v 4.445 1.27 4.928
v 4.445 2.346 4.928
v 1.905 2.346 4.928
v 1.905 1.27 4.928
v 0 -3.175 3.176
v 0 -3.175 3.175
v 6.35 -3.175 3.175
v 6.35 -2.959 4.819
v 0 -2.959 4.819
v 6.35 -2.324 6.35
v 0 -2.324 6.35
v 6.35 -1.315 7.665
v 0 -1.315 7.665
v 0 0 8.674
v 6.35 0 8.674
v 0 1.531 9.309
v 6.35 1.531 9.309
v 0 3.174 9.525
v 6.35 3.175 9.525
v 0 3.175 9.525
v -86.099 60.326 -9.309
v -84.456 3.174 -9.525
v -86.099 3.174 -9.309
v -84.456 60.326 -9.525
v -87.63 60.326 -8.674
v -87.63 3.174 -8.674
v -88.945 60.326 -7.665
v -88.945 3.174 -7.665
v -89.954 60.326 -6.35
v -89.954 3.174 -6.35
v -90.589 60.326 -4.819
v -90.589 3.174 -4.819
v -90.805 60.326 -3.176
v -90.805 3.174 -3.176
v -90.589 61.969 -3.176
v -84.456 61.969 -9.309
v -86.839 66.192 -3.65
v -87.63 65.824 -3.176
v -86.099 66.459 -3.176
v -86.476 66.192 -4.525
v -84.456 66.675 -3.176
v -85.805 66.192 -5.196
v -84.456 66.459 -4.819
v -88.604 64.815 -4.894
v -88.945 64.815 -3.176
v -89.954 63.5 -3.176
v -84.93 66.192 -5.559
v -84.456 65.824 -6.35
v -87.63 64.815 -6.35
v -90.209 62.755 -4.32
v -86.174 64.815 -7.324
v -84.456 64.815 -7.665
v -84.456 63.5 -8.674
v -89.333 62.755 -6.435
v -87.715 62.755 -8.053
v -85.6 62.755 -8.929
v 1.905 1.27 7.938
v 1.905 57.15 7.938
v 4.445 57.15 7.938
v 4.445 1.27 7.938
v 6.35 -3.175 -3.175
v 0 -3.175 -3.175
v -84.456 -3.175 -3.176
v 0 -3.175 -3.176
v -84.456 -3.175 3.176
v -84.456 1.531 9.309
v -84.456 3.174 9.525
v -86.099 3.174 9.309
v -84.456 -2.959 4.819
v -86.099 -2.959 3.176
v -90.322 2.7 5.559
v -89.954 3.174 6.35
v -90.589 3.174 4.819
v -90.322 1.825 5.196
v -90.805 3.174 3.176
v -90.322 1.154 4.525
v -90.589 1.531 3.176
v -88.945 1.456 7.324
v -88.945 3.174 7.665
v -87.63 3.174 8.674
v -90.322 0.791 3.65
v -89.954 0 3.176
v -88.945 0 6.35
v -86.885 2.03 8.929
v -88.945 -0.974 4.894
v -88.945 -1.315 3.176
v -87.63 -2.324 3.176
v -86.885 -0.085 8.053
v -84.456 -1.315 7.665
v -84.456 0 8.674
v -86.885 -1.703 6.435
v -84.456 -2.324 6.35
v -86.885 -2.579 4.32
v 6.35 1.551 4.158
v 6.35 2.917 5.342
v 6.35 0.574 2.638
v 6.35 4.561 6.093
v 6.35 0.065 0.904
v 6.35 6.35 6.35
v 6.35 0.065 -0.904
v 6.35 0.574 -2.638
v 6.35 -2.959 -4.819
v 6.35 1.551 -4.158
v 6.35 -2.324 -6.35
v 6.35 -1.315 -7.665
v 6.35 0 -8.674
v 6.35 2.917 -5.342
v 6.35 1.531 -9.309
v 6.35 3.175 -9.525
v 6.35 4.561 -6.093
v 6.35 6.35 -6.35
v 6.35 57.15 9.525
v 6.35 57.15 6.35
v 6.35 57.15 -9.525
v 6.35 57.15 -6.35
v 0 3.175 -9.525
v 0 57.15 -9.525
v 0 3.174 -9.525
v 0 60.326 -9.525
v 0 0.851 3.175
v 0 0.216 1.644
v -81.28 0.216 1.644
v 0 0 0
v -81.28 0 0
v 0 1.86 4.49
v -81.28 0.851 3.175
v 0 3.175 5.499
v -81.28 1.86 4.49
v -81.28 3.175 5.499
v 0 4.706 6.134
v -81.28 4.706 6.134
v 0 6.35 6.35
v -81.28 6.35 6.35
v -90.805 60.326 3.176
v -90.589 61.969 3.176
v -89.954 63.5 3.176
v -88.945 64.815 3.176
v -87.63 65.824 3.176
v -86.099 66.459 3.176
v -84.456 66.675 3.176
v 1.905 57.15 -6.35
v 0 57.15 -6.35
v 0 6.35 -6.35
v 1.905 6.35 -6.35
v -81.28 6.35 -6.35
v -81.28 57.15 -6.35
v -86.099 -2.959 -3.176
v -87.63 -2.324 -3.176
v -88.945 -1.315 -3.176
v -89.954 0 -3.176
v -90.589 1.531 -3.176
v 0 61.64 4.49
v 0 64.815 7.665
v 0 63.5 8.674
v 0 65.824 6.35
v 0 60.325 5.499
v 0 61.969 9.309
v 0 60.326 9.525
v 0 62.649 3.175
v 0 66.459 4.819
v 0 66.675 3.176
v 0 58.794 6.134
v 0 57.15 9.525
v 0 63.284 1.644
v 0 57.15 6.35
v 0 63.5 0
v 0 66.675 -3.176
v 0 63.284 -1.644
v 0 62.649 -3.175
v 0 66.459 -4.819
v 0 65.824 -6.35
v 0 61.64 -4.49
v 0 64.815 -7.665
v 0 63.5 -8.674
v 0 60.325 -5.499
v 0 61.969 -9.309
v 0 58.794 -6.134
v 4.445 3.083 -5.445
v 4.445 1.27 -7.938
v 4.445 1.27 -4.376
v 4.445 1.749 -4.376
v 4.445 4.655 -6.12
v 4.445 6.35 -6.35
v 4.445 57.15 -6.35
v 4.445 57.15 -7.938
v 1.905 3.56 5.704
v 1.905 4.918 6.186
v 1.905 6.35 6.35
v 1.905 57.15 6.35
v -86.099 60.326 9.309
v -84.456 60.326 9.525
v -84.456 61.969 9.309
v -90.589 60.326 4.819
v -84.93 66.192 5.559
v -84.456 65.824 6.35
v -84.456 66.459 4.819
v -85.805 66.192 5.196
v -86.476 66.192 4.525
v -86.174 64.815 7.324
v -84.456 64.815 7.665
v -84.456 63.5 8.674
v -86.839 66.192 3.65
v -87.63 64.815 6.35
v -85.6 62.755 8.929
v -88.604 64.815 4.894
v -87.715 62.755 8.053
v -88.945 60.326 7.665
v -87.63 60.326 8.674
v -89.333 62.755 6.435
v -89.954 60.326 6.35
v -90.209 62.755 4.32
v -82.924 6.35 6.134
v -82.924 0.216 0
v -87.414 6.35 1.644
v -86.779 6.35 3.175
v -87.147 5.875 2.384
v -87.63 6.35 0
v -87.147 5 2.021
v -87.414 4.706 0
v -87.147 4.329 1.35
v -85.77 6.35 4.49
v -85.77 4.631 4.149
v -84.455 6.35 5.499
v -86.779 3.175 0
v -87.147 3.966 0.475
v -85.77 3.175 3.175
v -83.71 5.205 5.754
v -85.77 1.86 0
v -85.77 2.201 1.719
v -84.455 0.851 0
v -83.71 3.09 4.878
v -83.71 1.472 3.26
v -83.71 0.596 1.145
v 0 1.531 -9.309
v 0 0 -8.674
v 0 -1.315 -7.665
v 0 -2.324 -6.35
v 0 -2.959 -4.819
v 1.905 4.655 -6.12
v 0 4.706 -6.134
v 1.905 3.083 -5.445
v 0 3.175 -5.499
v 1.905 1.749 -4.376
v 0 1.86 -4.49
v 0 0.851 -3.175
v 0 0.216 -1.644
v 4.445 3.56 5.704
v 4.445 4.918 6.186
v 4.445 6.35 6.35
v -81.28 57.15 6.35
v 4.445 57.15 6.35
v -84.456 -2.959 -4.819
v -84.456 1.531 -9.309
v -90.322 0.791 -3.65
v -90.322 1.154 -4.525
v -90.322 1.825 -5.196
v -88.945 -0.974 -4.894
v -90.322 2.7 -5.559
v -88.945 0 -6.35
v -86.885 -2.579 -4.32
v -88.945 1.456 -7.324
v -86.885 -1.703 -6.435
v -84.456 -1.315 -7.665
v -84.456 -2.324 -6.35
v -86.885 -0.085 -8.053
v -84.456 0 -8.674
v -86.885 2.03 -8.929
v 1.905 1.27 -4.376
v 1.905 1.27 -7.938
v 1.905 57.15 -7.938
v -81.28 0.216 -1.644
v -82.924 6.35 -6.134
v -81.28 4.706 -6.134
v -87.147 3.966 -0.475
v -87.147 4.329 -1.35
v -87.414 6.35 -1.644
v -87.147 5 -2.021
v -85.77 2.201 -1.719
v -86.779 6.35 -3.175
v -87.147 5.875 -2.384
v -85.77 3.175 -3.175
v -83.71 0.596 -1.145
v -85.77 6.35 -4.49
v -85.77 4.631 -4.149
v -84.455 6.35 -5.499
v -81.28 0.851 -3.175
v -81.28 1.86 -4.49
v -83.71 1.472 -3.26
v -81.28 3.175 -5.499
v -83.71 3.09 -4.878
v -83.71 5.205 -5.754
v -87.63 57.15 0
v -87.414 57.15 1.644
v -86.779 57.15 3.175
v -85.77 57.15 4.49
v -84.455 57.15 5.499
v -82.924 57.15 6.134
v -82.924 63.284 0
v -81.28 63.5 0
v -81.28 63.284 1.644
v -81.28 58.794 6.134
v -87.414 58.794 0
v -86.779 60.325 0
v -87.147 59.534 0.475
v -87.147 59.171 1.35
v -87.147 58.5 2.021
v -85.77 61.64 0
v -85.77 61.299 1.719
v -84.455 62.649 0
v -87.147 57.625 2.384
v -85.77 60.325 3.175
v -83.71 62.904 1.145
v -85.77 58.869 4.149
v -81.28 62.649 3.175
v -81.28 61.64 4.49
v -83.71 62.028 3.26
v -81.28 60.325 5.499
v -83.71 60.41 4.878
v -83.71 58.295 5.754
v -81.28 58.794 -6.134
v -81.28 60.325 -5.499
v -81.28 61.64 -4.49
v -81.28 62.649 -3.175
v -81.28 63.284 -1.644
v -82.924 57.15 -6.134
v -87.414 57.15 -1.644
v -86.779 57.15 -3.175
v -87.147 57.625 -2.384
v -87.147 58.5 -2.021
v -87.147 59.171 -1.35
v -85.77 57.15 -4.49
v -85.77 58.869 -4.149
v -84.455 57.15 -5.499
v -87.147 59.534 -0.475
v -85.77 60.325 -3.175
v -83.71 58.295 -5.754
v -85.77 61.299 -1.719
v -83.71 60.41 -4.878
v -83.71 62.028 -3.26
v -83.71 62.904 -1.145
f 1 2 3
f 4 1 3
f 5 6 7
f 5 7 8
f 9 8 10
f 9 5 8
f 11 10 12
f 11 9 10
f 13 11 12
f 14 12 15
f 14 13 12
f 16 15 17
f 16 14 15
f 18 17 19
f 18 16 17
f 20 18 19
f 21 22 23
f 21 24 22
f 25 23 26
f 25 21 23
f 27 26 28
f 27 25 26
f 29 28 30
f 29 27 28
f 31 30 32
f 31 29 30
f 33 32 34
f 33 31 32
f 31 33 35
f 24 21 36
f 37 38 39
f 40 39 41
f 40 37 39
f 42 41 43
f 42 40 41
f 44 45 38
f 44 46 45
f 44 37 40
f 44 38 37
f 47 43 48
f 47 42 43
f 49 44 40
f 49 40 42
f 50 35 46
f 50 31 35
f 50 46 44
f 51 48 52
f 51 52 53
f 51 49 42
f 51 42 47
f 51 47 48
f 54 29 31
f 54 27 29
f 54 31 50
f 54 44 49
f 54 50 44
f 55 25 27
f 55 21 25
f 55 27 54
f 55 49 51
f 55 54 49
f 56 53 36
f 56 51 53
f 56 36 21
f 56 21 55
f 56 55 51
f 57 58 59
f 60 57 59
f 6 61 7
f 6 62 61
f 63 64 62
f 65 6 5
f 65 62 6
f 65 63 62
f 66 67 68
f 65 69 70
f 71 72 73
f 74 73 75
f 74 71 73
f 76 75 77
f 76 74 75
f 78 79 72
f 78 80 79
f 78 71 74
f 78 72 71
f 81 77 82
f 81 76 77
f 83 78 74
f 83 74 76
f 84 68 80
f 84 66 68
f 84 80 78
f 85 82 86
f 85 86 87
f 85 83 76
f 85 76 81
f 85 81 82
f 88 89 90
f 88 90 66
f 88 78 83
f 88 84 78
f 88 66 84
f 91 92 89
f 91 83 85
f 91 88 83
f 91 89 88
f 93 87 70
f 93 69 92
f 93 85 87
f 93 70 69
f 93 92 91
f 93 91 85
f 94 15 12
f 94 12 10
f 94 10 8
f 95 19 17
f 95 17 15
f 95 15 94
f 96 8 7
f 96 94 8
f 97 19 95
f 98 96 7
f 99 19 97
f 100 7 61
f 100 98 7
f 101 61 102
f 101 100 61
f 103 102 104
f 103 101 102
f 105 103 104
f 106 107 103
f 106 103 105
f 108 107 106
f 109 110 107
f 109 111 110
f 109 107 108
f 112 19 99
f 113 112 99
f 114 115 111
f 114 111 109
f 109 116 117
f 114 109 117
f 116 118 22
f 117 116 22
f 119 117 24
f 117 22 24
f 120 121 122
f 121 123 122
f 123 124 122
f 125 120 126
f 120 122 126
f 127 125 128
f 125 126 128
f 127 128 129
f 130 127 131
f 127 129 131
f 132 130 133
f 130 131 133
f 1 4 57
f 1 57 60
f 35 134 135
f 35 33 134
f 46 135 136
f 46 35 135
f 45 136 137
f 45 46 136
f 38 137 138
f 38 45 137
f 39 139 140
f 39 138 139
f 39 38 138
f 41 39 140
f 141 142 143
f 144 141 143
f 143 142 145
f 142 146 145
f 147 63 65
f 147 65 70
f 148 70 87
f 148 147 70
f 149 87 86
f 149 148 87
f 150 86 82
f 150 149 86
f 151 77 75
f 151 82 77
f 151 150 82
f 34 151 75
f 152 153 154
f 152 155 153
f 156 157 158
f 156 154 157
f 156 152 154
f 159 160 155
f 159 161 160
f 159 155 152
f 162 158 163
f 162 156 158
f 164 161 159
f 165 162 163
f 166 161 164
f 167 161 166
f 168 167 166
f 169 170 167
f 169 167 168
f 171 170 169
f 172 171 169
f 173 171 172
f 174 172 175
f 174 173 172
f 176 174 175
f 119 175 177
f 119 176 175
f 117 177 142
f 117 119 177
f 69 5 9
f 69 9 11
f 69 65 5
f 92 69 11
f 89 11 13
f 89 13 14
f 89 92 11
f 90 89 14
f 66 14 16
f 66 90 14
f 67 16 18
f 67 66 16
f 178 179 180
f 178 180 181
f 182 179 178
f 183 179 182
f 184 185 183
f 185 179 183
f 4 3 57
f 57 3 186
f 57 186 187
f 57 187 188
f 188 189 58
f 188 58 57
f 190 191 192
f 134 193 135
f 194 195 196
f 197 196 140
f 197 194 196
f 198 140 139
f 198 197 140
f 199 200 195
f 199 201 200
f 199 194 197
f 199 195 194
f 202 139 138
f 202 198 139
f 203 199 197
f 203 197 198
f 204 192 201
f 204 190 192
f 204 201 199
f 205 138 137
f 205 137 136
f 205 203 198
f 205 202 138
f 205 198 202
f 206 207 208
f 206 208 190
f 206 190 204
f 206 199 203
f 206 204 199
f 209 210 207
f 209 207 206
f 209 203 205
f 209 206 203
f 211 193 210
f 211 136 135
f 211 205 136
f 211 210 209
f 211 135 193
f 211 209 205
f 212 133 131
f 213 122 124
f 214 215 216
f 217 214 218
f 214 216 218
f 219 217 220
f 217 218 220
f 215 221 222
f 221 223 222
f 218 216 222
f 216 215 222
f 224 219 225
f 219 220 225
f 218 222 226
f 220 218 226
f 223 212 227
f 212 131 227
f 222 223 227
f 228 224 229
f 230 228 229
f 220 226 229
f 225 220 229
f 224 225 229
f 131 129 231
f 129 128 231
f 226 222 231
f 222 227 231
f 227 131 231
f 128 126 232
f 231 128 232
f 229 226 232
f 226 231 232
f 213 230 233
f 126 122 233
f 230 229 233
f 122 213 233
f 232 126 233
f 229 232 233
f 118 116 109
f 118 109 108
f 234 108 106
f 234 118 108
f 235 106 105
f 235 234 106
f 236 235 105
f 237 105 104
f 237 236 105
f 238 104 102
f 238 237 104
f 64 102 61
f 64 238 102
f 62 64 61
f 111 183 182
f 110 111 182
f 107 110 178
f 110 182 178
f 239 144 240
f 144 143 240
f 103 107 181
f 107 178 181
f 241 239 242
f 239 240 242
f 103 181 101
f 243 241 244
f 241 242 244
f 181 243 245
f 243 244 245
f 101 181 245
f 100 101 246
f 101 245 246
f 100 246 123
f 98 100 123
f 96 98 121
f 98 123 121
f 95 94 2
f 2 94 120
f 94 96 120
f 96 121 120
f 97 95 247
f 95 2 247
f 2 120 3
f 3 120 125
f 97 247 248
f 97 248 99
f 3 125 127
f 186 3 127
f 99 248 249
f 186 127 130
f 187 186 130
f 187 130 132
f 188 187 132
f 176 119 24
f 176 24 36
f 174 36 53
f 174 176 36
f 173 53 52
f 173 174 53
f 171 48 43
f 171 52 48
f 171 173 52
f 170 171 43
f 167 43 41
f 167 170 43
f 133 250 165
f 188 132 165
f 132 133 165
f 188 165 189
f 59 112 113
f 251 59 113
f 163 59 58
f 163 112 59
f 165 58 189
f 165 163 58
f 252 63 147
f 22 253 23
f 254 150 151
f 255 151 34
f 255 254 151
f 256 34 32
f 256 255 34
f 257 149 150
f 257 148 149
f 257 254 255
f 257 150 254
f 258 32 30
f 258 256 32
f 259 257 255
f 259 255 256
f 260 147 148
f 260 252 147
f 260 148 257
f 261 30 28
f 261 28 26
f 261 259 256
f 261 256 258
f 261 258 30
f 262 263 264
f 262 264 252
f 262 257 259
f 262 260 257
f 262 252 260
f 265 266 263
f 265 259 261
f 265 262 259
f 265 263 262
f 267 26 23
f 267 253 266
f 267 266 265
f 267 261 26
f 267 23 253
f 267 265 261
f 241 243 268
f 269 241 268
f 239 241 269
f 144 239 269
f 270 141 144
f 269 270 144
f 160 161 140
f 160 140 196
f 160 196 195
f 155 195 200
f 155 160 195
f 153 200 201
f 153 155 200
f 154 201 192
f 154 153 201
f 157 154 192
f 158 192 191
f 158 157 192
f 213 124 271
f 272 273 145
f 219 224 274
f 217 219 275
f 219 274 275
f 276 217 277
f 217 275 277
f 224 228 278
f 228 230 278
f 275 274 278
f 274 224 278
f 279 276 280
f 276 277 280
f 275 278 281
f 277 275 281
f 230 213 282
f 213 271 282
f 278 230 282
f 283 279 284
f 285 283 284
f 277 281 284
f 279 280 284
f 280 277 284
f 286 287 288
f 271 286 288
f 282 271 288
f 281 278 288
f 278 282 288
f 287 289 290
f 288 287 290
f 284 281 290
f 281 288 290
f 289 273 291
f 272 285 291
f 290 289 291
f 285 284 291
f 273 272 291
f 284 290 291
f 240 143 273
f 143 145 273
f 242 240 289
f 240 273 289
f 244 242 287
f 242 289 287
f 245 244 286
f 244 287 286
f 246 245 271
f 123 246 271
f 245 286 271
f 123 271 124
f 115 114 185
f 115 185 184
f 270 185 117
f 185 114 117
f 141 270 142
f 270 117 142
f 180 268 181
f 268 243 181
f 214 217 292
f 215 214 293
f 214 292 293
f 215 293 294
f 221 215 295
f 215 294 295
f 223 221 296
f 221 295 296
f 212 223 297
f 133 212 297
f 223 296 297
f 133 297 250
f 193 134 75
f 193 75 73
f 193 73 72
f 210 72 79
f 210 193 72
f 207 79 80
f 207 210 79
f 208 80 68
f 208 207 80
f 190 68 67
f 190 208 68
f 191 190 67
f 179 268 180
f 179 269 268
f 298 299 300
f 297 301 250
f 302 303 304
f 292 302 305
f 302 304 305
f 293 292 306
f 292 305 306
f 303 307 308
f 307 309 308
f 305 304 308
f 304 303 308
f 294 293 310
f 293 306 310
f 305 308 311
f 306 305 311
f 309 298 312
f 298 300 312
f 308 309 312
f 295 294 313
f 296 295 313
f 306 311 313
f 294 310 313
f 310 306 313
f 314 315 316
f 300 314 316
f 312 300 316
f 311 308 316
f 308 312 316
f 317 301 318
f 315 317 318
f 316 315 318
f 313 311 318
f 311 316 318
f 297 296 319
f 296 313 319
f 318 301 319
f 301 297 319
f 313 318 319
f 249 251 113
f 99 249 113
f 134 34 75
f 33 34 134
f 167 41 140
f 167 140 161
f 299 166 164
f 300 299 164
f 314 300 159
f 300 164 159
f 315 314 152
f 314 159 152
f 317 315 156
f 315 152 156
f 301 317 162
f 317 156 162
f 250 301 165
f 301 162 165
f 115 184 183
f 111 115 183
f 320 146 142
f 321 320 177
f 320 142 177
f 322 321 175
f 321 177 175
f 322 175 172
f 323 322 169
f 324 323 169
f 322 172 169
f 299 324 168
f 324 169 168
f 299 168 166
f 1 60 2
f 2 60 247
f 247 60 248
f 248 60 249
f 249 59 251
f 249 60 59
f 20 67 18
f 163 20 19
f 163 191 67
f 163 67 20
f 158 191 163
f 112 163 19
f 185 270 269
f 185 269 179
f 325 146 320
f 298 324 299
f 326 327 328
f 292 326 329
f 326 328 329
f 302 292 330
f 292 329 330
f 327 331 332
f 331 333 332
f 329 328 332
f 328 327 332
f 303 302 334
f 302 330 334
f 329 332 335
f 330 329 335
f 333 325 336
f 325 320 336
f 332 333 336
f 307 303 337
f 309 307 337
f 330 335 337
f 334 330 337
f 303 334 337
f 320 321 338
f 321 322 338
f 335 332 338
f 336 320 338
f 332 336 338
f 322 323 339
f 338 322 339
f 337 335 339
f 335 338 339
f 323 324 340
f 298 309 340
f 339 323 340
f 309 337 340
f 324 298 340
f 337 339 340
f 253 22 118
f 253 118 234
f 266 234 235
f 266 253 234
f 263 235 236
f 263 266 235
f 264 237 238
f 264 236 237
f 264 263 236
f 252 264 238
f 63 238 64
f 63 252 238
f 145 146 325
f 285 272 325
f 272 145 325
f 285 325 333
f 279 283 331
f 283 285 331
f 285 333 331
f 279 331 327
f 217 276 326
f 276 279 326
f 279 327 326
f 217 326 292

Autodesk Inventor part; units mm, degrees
ref_plane "YZ Plane" through (0, 0, 0) normal (1, 0, 0) x (0, 1, 0)
ref_plane "XZ Plane" through (0, 0, 0) normal (0, 1, 0) x (-1, 0, 0)
ref_plane "XY Plane" through (0, 0, 0) normal (0, 0, 1) x (1, 0, 0)
sketch "Sketch1" plane through (0, 0, 0) normal (0, 0, 1) x (1, 0, 0)
  line L0 (0, 0) -> (-87.63, 0)
  line L1 (-87.63, 0) -> (-87.63, 63.5)
  line L2 (-87.63, 63.5) -> (0, 63.5)
  line L3 (0, 63.5) -> (0, 0)
  dimension "d0" = 87.63
  dimension "d1" = 63.5
sketch "Sketch2" plane through (0, 0, 0) normal (0, 0, 1) x (1, 0, 0)
  line L0 (0, -3.175) -> (-90.805, -3.175)
  line L1 (-90.805, -3.175) -> (-90.805, 66.675)
  line L2 (-90.805, 66.675) -> (0, 66.675)
  line L3 (0, 66.675) -> (0, -3.175)
  line L4 (-87.63, 63.5) -> (0, 63.5) projected
  point P0 (0, 0)
  dimension "d2" = 3.175
  dimension "d3" = 3.175
  dimension "d4" = 66.675
  dimension "d6" = 0
extrude "Extrusion1" add sketch "Sketch2" along normal mid plane 19.05
extrude "Extrusion2" cut sketch "Sketch1" along normal mid plane 12.7
fillet "Fillet1" radius 6.35 16 edges at (-43.815, 63.5, 6.35) (-43.815, 63.5, -6.35) (-43.815, 0, -6.35) (-45.4025, -3.175, 9.525) (-43.815, 0, 6.35) (-45.4025, -3.175, -9.525) (-90.805, 31.75, -9.525) (-90.805, -3.175, 0) (-90.805, 31.75, 9.525) (-90.805, 66.675, 0) (-45.4025, 66.675, -9.525) (-45.4025, 66.675, 9.525) (-87.63, 31.75, 6.35) (-87.63, 31.75, -6.35) (-87.63, 63.5, 0) (-87.63, 0, 0)
sketch "Sketch3" plane through (0, 3.175, -9.525) normal (1, 0, 0) x (0, 0, -1)
  line L0 (-3.175, 53.975) -> (-3.175, 3.175) projected
  arc A0 (-15.875, 3.175) -> (-3.175, 3.175) centre (-9.525, 3.175) ccw projected
  line L1 (-15.875, 3.175) -> (-15.875, 53.975) projected
  arc A1 (-3.175, 53.975) -> (-15.875, 53.975) centre (-9.525, 53.975) ccw construction
  arc A2 (-19.05, 0) -> (-12.7, -6.35) centre (-12.7, 0) ccw projected
  line L2 (-6.35, -6.35) -> (-12.7, -6.35) projected
  arc A3 (-6.35, -6.35) -> (0, 0) centre (-6.35, 0) ccw projected
  line L3 (0, 57.15) -> (0, 0) construction
  arc A4 (0, 57.15) -> (-6.35, 63.5) centre (-6.35, 57.15) ccw construction
  line L4 (-12.7, 63.5) -> (-6.35, 63.5) construction
  arc A5 (-12.7, 63.5) -> (-19.05, 57.15) centre (-12.7, 57.15) ccw construction
  line L5 (-19.05, 0) -> (-19.05, 57.15) construction
  line L6 (-19.05, 0) -> (-19.05, 53.975)
  line L7 (-19.05, 0) -> (-19.05, 57.15) construction
  line L8 (0, 0) -> (-6.35, 0) construction
  line L9 (0, 0) -> (0, 53.975)
  line L10 (0, 57.15) -> (0, 0) construction
  line L11 (-19.05, 53.975) -> (-15.875, 53.975)
  line L12 (0, 53.975) -> (-3.175, 53.975)
  point P0 (-9.525, -3.175)
extrude "Extrusion3" add sketch "Sketch3" along normal blind 6.35
sketch "Sketch4" plane through (0, 57.15, 9.525) normal (0, 1, 0) x (1, 0, 0)
  line L0 (6.35, 15.875) -> (-81.28, 15.875) construction
  line L1 (4.445, 15.875) -> (1.905, 15.875) construction
  line L2 (1.905, 15.875) -> (1.905, 17.4625)
  line L3 (1.905, 17.4625) -> (4.445, 17.4625)
  line L4 (4.445, 17.4625) -> (4.445, 15.875)
  line L5 (6.35, 19.05) -> (6.35, 15.875) construction
  line L6 (-3.9045, 9.525) -> (6.35, 9.525) construction
  line L7 (1.905, 3.175) -> (1.905, 1.5875)
  line L8 (1.905, 1.5875) -> (4.445, 1.5875)
  line L9 (4.445, 1.5875) -> (4.445, 3.175)
  line L10 (0, 3.175) -> (6.35, 3.175) construction
  line L11 (1.905, 15.875) -> (1.905, 13.9011)
  line L12 (1.905, 13.9011) -> (4.445, 13.9011)
  line L13 (4.445, 13.9011) -> (4.445, 15.875)
  line L14 (4.445, 3.175) -> (4.445, 4.5966)
  line L15 (4.445, 4.5966) -> (1.905, 4.5966)
  line L16 (1.905, 4.5966) -> (1.905, 3.175)
  point P0 (0, 9.525)
  dimension "d14" = 2.54
  dimension "d15" = 1.5875
  dimension "d16" = 1.905
extrude "Extrusion4" cut sketch "Sketch4" against normal blind 55.88
properties part number "Marcus' Case"
